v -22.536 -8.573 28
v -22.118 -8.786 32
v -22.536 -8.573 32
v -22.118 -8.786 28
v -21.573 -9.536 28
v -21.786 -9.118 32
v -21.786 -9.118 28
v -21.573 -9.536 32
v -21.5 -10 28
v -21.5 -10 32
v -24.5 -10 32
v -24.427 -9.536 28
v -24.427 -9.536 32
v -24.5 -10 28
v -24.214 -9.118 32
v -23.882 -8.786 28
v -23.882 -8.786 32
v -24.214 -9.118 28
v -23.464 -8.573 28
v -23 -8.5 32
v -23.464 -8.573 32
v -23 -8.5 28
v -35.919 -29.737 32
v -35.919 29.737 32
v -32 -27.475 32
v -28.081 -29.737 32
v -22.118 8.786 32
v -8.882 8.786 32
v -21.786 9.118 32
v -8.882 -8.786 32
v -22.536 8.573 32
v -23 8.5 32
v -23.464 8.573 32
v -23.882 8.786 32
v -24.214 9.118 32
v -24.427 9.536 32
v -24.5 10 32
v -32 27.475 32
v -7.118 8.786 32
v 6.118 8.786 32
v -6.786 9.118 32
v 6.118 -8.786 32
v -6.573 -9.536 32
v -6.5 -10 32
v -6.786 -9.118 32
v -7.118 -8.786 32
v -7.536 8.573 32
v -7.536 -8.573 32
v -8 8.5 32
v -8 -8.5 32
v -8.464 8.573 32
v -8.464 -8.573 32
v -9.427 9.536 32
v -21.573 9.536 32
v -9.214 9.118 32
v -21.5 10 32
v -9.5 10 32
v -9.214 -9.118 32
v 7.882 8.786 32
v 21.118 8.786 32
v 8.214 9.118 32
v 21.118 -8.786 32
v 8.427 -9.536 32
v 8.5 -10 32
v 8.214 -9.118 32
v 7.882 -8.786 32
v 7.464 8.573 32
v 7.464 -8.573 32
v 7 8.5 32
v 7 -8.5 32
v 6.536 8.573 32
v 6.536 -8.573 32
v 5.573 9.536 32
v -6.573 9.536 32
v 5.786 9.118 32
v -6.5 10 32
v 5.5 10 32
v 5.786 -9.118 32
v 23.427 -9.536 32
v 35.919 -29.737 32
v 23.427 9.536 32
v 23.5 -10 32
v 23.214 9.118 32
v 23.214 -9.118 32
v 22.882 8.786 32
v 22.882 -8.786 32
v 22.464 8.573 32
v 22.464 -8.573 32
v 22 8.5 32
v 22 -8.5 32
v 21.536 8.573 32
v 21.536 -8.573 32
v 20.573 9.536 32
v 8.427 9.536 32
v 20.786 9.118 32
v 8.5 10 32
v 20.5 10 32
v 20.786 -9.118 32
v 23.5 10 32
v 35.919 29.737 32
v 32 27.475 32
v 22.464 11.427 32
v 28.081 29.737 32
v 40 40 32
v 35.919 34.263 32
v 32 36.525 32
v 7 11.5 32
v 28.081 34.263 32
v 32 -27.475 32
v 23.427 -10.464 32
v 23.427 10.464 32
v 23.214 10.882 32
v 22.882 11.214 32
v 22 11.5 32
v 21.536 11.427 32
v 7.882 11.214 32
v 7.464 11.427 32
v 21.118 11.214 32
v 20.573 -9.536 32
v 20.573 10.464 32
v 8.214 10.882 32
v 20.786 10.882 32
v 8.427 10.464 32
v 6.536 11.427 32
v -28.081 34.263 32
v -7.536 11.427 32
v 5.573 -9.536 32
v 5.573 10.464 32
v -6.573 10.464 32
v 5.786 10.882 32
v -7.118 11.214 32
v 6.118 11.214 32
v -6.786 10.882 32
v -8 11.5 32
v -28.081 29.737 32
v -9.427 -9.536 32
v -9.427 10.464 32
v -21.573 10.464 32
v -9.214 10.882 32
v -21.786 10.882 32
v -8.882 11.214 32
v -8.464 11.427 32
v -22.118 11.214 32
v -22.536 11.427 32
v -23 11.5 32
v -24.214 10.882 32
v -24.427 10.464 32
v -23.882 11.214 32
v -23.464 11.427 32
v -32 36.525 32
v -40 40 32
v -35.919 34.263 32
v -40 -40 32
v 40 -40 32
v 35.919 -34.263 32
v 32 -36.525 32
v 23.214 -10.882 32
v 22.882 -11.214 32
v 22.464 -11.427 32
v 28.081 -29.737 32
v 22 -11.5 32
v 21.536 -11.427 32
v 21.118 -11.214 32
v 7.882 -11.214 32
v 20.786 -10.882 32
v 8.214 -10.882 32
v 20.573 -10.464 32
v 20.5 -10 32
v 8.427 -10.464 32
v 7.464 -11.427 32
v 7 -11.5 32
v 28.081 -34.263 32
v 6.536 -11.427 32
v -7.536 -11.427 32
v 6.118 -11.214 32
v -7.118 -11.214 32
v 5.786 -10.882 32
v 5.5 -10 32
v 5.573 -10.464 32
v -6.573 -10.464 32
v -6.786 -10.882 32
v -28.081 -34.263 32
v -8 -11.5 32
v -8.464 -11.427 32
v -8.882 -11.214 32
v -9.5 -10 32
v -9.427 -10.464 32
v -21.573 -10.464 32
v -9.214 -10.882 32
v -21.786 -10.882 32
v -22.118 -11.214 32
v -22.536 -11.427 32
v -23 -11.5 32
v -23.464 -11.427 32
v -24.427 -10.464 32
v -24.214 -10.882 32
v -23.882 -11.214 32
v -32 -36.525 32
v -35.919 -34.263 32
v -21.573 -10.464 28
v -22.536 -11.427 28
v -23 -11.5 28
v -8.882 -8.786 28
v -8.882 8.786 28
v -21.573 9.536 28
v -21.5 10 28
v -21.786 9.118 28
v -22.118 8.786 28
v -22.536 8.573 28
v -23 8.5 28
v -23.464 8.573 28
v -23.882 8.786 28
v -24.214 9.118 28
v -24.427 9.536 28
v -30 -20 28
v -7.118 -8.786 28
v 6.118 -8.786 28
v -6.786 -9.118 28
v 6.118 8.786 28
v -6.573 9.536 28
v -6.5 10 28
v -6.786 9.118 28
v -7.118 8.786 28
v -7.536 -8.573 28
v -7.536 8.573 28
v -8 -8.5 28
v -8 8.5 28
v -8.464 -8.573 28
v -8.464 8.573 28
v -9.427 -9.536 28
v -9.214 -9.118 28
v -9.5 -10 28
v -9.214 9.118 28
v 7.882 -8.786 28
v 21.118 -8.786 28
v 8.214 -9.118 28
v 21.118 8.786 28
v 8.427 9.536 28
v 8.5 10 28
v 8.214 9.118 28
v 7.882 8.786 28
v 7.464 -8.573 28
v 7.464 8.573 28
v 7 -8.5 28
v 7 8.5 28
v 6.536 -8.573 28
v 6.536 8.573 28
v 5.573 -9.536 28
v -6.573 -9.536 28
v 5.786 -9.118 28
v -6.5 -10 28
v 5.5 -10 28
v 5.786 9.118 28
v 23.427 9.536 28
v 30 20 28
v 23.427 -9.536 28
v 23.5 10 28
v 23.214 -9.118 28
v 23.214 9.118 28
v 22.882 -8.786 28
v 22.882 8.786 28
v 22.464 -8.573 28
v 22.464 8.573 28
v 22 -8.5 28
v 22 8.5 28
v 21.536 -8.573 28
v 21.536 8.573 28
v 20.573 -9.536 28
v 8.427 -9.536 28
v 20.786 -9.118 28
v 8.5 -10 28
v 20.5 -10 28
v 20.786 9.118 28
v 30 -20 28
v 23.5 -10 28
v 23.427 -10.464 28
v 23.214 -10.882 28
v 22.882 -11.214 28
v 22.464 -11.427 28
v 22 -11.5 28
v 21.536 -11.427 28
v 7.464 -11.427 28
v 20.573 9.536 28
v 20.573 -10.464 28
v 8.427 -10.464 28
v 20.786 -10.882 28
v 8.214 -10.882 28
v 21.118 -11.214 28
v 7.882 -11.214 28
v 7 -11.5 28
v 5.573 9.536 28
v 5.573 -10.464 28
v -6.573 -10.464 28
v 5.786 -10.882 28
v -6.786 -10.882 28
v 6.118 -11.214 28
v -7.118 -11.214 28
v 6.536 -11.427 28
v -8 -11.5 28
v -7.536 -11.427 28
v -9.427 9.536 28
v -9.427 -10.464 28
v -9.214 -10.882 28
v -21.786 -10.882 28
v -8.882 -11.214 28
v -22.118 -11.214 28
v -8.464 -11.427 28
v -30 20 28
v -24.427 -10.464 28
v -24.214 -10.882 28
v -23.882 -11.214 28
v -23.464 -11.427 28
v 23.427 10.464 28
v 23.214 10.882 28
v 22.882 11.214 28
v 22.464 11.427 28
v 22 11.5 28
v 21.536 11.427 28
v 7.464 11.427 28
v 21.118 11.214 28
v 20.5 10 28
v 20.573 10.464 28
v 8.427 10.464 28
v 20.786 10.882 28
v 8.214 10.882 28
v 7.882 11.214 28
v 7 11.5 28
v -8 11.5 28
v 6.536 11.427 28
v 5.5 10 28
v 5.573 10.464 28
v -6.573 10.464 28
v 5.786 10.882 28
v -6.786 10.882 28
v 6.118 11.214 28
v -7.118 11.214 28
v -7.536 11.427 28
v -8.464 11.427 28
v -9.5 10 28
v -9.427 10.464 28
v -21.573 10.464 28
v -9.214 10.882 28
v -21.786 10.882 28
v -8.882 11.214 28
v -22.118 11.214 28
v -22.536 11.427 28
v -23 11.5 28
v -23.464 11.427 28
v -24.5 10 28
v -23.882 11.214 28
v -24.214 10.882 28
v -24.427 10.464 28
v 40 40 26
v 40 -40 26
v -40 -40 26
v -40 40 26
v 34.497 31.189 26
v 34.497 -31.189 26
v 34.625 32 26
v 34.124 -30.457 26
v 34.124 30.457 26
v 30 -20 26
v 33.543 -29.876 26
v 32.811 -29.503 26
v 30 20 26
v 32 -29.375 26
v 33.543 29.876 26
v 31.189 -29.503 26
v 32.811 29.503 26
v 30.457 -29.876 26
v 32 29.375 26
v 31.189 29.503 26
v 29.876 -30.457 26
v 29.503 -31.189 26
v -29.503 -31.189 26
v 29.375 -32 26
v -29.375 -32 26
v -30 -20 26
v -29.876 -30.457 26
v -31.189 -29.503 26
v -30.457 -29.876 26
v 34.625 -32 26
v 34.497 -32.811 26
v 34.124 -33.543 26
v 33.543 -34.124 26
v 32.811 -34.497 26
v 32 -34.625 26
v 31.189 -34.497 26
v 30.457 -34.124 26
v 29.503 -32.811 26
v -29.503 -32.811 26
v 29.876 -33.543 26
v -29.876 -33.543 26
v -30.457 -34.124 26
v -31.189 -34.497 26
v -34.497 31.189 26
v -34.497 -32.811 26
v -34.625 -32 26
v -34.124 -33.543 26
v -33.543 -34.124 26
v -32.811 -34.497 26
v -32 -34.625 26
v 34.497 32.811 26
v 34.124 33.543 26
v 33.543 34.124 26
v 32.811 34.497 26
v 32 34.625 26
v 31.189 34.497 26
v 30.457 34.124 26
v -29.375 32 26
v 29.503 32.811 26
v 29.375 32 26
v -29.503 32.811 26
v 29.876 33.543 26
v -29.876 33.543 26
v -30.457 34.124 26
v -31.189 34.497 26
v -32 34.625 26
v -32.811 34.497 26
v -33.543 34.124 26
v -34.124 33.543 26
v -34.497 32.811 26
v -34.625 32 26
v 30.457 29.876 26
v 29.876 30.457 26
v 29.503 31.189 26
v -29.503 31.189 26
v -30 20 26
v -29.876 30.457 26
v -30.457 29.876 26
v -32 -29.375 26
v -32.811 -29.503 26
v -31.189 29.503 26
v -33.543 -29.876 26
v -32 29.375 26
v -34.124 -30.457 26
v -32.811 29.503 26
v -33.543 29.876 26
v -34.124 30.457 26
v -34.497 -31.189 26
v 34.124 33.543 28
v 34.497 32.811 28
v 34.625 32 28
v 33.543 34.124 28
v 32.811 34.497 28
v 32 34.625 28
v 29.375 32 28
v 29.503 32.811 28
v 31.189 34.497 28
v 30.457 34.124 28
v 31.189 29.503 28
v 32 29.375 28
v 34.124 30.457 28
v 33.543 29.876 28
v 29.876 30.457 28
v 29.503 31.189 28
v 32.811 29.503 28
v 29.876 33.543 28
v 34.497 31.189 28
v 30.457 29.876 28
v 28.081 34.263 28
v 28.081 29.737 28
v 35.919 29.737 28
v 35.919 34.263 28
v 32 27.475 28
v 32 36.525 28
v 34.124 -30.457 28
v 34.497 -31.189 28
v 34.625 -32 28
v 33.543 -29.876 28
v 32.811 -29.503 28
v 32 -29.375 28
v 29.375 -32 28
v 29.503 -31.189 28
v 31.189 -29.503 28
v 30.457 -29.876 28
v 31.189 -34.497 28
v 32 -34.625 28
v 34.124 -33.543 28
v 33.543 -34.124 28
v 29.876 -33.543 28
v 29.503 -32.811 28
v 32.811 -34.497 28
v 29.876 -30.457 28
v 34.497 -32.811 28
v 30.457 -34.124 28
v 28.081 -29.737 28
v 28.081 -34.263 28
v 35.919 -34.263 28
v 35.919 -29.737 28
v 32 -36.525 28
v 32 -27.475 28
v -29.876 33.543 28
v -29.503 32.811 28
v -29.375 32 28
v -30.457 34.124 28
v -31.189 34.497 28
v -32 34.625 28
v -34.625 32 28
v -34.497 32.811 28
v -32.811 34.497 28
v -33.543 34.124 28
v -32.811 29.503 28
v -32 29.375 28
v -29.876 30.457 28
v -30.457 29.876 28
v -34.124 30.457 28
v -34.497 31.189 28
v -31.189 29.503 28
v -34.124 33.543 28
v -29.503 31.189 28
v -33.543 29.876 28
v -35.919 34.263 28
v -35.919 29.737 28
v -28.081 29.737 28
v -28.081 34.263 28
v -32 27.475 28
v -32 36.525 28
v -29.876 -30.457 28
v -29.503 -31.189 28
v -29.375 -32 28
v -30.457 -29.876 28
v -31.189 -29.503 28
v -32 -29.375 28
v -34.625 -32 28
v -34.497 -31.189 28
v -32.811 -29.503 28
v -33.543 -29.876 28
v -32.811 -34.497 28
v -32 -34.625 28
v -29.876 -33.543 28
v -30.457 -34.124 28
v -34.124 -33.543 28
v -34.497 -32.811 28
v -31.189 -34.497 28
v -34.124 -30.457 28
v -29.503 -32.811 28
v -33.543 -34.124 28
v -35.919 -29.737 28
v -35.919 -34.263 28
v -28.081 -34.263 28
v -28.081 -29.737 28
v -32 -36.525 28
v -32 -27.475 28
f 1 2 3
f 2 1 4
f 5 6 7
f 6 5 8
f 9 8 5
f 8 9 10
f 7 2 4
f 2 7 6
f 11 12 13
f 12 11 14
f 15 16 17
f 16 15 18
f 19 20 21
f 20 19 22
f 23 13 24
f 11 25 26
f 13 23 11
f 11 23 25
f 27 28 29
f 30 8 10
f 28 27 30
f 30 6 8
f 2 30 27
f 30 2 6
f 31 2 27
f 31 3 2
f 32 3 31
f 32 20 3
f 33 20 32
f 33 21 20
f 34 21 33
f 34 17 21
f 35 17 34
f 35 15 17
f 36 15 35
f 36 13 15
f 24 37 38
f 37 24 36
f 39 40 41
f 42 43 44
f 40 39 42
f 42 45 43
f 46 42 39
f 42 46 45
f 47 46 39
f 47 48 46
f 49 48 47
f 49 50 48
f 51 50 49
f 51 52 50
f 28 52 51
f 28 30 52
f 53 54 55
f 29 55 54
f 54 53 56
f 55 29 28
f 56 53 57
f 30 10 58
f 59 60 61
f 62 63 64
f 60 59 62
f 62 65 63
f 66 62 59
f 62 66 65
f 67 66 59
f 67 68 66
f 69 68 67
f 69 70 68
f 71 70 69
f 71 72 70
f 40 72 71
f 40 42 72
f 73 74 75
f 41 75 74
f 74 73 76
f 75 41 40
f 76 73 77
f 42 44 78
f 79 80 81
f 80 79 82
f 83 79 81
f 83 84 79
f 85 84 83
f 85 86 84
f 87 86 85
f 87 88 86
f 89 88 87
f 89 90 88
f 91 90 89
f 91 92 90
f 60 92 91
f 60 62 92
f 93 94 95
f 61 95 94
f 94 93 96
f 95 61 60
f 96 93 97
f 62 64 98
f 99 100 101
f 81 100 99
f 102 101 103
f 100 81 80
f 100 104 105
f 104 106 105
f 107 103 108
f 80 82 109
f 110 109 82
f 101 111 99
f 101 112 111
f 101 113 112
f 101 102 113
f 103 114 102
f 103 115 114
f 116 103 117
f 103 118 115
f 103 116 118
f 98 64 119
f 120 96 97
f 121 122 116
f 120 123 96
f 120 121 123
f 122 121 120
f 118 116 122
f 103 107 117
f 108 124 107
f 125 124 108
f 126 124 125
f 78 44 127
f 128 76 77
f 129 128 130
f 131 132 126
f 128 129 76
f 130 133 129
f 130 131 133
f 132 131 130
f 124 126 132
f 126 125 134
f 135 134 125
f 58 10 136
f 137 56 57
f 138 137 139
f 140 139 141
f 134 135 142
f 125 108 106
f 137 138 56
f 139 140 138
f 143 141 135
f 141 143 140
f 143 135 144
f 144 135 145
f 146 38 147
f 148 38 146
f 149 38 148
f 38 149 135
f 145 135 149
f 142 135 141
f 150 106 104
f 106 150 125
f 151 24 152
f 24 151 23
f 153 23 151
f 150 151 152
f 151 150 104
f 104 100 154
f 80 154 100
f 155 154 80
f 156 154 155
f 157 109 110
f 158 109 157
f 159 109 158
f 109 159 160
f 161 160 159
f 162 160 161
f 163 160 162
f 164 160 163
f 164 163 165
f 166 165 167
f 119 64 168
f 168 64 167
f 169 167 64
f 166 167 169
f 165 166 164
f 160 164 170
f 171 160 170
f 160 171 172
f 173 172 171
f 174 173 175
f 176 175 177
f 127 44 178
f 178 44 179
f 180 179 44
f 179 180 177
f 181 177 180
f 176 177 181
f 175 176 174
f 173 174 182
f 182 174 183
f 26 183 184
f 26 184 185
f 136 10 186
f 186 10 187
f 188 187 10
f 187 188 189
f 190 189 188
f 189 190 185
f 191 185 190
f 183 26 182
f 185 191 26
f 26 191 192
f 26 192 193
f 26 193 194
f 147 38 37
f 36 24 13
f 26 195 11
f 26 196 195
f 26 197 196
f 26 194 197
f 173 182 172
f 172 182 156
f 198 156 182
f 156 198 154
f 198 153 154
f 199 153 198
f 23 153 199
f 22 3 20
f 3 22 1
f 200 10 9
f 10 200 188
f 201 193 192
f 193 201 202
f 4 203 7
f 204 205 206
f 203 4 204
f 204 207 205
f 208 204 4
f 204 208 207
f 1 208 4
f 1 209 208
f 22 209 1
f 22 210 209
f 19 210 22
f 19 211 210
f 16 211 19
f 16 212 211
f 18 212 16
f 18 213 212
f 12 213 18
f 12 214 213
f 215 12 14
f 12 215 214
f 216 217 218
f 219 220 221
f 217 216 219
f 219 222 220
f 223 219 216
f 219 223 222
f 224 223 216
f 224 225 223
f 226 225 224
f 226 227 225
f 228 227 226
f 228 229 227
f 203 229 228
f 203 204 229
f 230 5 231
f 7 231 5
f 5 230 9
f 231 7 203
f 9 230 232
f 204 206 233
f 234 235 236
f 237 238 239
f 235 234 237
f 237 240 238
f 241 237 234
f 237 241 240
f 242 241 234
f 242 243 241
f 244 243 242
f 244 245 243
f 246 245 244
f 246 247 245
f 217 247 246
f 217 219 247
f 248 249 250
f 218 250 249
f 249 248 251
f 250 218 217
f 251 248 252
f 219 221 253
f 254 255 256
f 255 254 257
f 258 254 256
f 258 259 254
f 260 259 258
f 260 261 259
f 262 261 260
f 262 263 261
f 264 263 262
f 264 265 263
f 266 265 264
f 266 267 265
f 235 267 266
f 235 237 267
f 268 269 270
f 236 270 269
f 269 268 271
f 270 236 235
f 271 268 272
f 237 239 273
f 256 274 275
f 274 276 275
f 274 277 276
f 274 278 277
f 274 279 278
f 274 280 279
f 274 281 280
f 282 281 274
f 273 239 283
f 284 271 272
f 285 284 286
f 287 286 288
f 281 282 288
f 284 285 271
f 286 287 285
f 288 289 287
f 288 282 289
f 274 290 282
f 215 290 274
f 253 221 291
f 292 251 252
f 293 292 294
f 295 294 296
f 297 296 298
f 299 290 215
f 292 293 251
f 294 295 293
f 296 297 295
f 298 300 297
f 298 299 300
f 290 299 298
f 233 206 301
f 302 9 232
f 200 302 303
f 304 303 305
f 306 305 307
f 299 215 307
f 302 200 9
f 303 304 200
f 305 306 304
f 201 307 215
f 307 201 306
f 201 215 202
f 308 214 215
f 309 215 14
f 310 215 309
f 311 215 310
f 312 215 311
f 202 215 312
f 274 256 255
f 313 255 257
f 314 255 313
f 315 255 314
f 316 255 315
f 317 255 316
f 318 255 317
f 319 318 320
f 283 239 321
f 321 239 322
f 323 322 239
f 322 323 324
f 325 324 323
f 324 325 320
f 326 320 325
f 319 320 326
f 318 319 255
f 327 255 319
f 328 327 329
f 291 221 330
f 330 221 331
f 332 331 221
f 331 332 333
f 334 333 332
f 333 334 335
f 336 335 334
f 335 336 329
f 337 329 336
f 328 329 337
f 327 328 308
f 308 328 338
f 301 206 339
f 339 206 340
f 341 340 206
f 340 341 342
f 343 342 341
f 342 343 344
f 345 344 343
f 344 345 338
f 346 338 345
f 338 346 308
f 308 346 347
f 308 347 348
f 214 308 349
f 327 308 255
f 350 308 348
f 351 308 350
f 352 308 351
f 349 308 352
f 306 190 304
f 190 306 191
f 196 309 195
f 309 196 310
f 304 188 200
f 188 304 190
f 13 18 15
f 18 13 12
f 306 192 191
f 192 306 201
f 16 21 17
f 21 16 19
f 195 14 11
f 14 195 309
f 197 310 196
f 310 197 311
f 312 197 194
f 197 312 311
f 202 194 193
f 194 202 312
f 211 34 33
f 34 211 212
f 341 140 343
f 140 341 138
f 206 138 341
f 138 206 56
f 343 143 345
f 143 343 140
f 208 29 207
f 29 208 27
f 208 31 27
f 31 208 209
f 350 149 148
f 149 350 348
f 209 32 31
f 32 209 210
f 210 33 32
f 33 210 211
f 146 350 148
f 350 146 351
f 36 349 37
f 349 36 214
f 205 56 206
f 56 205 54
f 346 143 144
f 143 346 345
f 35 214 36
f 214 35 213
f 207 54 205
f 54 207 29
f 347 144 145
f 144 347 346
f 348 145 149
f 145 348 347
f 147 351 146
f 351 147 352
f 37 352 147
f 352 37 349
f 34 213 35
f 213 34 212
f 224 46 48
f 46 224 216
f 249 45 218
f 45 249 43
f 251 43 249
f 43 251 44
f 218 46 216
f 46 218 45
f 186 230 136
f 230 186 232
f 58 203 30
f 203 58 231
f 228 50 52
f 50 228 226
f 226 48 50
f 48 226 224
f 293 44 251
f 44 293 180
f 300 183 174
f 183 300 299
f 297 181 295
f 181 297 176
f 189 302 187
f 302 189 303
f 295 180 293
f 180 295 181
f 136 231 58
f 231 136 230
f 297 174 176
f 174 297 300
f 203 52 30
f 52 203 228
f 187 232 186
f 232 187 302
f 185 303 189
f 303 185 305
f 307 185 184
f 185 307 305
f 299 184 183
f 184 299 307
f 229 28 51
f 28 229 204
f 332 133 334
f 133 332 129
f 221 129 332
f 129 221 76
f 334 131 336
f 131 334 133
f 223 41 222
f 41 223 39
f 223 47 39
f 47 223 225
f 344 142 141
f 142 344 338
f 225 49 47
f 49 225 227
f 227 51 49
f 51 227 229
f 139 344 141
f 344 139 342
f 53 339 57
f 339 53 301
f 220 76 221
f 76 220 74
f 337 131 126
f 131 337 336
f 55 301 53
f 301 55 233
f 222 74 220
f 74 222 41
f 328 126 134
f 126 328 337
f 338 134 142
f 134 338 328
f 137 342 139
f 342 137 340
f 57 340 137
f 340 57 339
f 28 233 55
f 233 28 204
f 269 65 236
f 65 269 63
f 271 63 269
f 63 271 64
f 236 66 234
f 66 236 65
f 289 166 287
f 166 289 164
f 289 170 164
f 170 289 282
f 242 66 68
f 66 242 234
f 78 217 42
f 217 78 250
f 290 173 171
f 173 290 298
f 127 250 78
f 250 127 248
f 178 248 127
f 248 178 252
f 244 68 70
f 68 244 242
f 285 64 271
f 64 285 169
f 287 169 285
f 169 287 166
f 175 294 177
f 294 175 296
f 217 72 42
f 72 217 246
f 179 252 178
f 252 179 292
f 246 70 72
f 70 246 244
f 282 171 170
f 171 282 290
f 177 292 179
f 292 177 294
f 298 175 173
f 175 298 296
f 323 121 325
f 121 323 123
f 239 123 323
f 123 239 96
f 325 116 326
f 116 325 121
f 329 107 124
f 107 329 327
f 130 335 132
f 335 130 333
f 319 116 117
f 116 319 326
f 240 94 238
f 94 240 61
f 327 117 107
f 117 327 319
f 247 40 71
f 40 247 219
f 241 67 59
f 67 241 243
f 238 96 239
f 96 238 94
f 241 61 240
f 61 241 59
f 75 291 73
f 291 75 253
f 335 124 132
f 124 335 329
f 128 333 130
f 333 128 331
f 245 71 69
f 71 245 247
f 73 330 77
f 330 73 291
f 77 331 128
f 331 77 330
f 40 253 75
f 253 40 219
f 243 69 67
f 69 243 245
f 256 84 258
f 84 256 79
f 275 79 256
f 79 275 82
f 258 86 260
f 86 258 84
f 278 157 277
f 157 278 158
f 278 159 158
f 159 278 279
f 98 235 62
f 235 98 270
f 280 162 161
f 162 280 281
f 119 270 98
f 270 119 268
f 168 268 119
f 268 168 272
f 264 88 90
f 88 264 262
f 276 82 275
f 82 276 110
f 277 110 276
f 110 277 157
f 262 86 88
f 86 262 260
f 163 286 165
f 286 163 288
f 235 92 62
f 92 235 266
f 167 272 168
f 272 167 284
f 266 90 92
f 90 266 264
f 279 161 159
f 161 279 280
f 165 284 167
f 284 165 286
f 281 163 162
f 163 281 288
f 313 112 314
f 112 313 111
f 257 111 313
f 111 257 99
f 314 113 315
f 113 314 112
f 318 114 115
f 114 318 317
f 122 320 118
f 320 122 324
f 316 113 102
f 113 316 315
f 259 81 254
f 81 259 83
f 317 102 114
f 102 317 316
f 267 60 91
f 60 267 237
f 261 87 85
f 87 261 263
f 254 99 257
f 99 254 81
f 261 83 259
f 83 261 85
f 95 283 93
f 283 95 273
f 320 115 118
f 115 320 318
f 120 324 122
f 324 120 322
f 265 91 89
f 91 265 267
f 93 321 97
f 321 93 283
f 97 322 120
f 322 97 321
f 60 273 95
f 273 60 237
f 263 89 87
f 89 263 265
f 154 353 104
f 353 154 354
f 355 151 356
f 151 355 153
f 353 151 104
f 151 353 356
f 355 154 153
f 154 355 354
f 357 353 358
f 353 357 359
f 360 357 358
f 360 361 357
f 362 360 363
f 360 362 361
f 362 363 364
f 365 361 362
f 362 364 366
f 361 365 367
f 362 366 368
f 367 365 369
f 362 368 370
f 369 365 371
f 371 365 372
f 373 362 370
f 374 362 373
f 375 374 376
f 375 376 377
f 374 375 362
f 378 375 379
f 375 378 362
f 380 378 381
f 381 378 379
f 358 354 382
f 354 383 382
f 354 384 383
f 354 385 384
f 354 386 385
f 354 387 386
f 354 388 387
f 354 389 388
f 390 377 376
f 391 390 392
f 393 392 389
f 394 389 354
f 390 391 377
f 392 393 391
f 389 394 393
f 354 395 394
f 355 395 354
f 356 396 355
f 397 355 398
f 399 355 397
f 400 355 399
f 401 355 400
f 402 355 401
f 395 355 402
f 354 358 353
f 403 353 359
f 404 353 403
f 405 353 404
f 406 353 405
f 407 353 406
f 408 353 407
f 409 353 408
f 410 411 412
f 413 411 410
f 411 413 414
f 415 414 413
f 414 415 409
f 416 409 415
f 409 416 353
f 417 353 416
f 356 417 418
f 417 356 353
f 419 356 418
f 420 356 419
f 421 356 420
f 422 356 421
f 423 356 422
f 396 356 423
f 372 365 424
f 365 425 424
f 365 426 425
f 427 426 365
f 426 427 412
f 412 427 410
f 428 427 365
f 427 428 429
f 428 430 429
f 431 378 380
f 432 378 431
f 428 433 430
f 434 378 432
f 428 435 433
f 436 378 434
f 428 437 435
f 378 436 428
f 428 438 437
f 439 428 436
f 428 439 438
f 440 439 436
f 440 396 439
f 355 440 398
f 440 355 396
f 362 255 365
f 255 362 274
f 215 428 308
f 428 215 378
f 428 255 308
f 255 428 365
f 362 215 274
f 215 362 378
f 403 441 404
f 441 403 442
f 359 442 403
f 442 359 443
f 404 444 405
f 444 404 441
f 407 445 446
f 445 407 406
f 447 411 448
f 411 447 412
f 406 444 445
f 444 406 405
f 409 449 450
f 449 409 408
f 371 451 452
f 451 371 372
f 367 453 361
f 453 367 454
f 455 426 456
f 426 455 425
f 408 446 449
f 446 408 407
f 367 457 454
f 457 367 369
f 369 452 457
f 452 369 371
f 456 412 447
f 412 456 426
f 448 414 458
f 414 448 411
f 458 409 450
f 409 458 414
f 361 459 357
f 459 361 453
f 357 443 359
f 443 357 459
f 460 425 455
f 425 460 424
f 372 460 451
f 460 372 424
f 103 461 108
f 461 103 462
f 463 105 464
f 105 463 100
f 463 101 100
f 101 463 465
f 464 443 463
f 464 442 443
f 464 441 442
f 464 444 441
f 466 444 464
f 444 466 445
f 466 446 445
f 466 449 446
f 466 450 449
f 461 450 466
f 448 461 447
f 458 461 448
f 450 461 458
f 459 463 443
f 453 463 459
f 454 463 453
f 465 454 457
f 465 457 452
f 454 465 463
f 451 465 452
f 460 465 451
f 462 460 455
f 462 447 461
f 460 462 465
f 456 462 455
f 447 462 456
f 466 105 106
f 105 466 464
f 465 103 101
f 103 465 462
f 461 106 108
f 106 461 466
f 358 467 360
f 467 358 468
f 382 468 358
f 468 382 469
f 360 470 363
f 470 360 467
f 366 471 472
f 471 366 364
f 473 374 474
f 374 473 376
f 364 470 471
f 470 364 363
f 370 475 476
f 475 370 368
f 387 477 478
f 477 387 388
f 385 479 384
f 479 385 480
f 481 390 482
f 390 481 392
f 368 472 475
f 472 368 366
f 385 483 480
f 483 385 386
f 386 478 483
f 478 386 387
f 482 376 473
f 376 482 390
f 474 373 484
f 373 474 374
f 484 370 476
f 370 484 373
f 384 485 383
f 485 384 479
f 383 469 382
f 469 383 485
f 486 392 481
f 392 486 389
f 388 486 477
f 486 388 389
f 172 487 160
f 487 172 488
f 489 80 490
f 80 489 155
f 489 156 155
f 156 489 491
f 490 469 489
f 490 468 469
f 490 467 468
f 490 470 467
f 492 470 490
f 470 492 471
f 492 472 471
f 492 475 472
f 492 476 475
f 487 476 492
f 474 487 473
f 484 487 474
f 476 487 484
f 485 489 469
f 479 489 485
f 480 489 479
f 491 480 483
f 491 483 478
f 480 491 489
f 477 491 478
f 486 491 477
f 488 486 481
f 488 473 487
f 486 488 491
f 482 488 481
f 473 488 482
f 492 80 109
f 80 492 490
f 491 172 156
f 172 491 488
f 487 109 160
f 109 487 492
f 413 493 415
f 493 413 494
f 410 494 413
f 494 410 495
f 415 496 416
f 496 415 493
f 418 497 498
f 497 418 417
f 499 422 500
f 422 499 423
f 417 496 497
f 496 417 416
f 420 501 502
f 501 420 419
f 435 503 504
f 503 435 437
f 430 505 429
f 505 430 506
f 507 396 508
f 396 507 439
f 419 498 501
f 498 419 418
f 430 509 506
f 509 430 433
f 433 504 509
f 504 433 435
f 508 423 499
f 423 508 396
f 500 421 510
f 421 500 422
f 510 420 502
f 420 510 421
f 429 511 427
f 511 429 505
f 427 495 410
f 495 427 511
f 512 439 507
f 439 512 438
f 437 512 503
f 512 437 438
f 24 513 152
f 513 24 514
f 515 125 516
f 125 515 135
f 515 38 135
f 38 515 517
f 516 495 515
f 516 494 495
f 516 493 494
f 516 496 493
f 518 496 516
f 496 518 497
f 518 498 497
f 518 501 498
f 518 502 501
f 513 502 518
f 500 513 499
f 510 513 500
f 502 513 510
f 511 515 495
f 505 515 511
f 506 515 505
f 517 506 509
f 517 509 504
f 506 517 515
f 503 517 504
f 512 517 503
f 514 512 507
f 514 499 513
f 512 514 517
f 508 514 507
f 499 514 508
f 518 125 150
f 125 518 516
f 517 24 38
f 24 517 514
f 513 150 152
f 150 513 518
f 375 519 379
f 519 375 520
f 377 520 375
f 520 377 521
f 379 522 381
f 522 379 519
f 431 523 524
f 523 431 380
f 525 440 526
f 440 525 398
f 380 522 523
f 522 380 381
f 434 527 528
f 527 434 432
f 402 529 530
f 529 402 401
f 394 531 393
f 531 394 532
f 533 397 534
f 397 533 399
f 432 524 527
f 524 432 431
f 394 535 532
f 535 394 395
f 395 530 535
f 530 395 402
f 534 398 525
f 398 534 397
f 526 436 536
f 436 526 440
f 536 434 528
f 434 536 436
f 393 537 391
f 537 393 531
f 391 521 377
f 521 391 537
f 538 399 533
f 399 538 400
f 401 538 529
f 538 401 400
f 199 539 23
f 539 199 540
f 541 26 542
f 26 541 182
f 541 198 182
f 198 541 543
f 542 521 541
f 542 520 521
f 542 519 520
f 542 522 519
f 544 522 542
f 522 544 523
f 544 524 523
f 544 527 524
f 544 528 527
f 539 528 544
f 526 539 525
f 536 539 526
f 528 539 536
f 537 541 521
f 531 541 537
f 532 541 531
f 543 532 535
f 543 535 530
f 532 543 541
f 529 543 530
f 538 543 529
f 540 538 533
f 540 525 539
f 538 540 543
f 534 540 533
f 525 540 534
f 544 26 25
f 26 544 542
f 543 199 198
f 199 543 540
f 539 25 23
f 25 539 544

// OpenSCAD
include <../libs/hardware.scad>;
w = 80;
d = 80;
h = 64;

m5_offset = 8;
wiring_ledge_offset = 5;

module ledge(){
// Wiring ledge
    bolt_mount = 34;
    difference(){
        union(){
            translate([w/2 , 0, wiring_ledge_offset])rotate([0, 90, 0]){
                difference() {
                    // inner cylinder
                    cylinder(d=30, h=20);
                    // half-cutout cube
                    translate([-15, -15, 0]) cube([15, 30, 40]);
                }
                // Cube for M3 bolt mounts
                translate([-bolt_mount/2, -bolt_mount/2, 0]) cube([bolt_mount, bolt_mount, 3]);
            }
        }
        translate([w/2 - 4, 0, wiring_ledge_offset])rotate([0, 90, 0]){
            // cut out wire hole in the back
            ledge_cut();
        }
    }
}

module ledge_cut(){
    cylinder(d=20, h=50);
    z_offset = 0.5;
    bolt_pattern = 13;
    // upper fasteners
    translate([-bolt_pattern, -bolt_pattern, z_offset])
        hole_w_end(12, $M_DIM[M3][4] + 0.5, "hex", $M_DIM[3][0], flip=true);
    translate([-bolt_pattern, bolt_pattern, 0.5])
        hole_w_end(12, $M_DIM[M3][4] + 0.5, "hex", $M_DIM[3][0], flip=true);
    // lower fasteners
    translate([bolt_pattern, bolt_pattern, 0.5])
        hole_w_end(12, $M_DIM[M3][4], "hex", $M_DIM[3][0], flip=true);
    translate([bolt_pattern, -bolt_pattern, 0.5])
        hole_w_end(12, $M_DIM[M3][4], "hex", $M_DIM[3][0], flip=true);
}


module box_body(show_ledge=true){
    difference(){
        union(){
            difference(){
                cube([w,d, h], center=true);
                translate([0,0, 0])cube([w-4, d-4, h-12], center=true);
                translate([0,0, h/2-6])cube([w-20, d-40, 4], center=true);
                // woodscrew cutout
                for ( i = [ 0: 15 : 45 ] ){
                    translate([-23 + i, -10, h/2 - 4]) cylinder(d=3, h=4, $fn=20);
                    translate([-23 + i, 10, h/2 - 4]) cylinder(d=3, h=4, $fn=20);
               }
            }
            if (show_ledge){
                ledge();
            }
            side_d = 13;
            //Support columns for M5 bolts
            translate([0,0, -60/2]){
                translate([w/2 - m5_offset, d/2 - m5_offset]) cylinder(d=side_d, h=60);
                translate([w/2 - m5_offset, -d/2 + m5_offset]) cylinder(d=side_d, h=60);
                translate([-w/2 + m5_offset, d/2 - m5_offset]) cylinder(d=side_d, h=60);
                translate([-w/2 + m5_offset, -d/2 + m5_offset]) cylinder(d=side_d, h=60);
            }
        }
        // cut out IEC 320 C14 socket
        translate([-76/2 + 2, 0, 0])rotate([90, 180, -90]) iec320_keyed(4,lip=1);
        // Cut out mounting bolts
        translate([0,0, -64/2]){
            translate([w/2 - m5_offset, d/2 - m5_offset]) bolt_nut(60, M5, flip=true);
            translate([w/2 - m5_offset, -d/2 + m5_offset]) bolt_nut(60, M5, flip=true);
            translate([-w/2 + m5_offset, d/2 - m5_offset]) bolt_nut(60, M5, flip=true);
            translate([-w/2 + m5_offset, -d/2 + m5_offset]) bolt_nut(60, M5, flip=true);
        }
        
        translate([w/2 - 4, 0, wiring_ledge_offset])rotate([0, 90, 0]){
            ledge_cut();
        }
        
    }
}

offset = 6;
module top(){
    difference(){
        box_body(show_ledge=false);
        translate([0,0, -offset/2 ]) cube([w, d, h - offset], center=true);
    }
}
module bottom(){
    difference(){
        box_body(show_ledge=false);
        translate([0,0, h/2 - offset/2]) cube([w, d, offset], center=true);
    }
}
top();
//bottom();
//ledge();
